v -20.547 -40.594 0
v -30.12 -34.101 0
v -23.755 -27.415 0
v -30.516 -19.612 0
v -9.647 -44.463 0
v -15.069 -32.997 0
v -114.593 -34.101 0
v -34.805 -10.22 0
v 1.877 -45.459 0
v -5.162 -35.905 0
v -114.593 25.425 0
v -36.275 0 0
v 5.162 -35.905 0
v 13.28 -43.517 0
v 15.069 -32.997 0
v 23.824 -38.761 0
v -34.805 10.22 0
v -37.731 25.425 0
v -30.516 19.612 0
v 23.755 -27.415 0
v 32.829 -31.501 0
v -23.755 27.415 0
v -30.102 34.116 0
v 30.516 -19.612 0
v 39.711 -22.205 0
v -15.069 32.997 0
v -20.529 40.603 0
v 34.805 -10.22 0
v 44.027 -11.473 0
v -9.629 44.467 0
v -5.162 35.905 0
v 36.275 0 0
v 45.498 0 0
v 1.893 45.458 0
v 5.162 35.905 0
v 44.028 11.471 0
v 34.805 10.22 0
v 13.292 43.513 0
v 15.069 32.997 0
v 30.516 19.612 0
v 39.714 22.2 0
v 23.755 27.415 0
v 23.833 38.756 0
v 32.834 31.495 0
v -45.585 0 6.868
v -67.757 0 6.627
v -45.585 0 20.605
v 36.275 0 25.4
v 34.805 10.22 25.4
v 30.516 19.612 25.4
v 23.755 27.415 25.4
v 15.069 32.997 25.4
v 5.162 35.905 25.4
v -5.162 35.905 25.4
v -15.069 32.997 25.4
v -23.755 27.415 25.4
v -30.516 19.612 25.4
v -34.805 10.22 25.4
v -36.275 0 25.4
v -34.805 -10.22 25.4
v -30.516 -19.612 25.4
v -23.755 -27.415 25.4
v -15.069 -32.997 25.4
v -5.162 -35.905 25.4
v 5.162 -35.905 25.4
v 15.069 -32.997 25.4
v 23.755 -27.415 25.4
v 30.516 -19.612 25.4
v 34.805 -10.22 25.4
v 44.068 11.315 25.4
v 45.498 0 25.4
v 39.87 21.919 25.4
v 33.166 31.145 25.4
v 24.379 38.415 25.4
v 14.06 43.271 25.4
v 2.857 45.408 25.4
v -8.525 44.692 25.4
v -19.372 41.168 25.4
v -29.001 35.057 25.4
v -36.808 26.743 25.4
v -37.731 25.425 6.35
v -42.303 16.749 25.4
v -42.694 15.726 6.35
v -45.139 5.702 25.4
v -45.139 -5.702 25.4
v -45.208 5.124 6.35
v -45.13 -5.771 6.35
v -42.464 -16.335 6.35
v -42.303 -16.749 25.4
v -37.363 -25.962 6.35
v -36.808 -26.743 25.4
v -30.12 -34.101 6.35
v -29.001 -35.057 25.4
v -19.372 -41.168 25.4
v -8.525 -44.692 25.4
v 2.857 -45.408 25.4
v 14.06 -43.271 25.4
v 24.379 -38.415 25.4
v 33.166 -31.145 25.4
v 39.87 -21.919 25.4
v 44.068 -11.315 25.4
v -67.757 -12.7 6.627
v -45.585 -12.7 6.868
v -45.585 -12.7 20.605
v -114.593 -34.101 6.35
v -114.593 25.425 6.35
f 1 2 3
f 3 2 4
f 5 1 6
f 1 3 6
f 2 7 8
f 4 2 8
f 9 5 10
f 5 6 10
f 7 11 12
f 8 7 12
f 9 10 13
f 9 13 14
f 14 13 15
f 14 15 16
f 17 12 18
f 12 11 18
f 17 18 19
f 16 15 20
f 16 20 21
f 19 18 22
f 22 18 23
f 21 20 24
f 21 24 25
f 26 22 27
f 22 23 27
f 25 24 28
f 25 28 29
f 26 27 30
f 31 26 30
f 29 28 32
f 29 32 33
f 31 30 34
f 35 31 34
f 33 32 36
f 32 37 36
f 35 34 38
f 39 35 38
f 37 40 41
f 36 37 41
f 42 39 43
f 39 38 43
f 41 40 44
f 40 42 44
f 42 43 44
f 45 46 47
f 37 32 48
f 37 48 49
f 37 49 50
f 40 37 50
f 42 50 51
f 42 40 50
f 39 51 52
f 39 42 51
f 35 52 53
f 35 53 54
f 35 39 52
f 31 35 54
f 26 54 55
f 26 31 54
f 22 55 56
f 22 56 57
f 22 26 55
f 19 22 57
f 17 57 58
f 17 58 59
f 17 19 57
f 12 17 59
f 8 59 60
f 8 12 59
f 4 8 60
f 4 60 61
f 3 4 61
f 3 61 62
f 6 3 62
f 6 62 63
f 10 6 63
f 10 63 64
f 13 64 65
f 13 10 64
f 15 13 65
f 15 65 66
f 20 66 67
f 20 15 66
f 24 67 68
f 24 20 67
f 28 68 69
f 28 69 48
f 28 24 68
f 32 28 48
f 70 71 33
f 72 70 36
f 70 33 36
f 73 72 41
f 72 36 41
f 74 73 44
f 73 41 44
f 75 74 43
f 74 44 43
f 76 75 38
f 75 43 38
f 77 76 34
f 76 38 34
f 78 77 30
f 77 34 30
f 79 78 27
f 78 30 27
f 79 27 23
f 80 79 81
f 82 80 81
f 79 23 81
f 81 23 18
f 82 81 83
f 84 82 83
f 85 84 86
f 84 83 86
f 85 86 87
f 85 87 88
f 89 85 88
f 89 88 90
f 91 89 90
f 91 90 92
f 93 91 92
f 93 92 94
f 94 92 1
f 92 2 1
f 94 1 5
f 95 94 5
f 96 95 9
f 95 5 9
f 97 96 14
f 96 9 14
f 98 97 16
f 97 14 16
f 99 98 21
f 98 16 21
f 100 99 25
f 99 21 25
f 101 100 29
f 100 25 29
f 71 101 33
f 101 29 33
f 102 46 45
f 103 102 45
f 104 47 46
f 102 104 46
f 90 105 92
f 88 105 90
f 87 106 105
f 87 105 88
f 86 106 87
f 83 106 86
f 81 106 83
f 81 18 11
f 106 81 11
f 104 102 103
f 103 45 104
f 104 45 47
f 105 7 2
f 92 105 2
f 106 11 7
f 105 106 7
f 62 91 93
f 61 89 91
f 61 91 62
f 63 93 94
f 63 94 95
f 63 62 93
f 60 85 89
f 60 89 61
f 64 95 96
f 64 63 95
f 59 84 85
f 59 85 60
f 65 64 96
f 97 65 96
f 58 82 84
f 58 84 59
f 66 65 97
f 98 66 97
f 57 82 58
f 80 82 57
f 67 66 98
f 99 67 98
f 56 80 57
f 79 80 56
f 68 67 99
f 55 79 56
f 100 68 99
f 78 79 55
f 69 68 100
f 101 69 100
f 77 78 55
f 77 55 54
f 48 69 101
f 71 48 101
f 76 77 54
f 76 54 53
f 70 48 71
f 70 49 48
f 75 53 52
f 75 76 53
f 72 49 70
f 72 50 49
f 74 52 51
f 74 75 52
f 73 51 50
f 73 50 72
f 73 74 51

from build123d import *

# Parameters (mm, degrees)
F0_R     = 36.2745976669
F1_DEPTH = 25.4
F2_DEPTH = 6.35
F4_DEPTH = 12.7


# Not quite as in the source:
# - a length typed as a fraction of an inch, garbled in the dataset ("3 / 203.2 mm" for 3/8 in), is restored


with BuildPart() as f1:
    # F0 (on Top) → F1 (new body)
    with BuildSketch(Plane.XY):
        with BuildLine():
            ThreePointArc((-30.119665644, -34.1006480157), (18.7038816469, -41.4754537641), (45.4977851505, 0))
            ThreePointArc((45.4977851505, 0), (13.2923607222, 43.5127751359), (-37.7309519745, 25.4248641431))
            ThreePointArc((-37.7309519745, 25.4248641431), (-45.1303470765, -5.770634831), (-30.119665644, -34.1006480157))
        make_face()
        Circle(F0_R, mode=Mode.SUBTRACT)
    extrude(amount=F1_DEPTH)

    # F0 (on Top) → F2 (join)
    with BuildSketch(Plane.XY):
        with BuildLine():
            ThreePointArc((-30.119665644, -34.1006480157), (-45.1303470765, -5.770634831), (-37.7309519745, 25.4248641431))
            Line((-37.7309519745, 25.4248641431), (-114.592641592, 25.4248641431))
            Line((-114.592641592, 25.4248641431), (-114.592641592, -34.1006480157))
            Line((-114.592641592, -34.1006480157), (-30.119665644, -34.1006480157))
        make_face()
    extrude(amount=F2_DEPTH)


with BuildPart() as f4:
    # F3 (on Front) → F4 (new body)
    with BuildSketch(Plane.XZ):
        Polygon((-45.5851592124, 20.6049848348), (-67.7566081285, 6.6273342818), (-45.5851592124, 6.8683284335), align=None)
    extrude(amount=F4_DEPTH)


solid = Compound([f1.part, f4.part])
